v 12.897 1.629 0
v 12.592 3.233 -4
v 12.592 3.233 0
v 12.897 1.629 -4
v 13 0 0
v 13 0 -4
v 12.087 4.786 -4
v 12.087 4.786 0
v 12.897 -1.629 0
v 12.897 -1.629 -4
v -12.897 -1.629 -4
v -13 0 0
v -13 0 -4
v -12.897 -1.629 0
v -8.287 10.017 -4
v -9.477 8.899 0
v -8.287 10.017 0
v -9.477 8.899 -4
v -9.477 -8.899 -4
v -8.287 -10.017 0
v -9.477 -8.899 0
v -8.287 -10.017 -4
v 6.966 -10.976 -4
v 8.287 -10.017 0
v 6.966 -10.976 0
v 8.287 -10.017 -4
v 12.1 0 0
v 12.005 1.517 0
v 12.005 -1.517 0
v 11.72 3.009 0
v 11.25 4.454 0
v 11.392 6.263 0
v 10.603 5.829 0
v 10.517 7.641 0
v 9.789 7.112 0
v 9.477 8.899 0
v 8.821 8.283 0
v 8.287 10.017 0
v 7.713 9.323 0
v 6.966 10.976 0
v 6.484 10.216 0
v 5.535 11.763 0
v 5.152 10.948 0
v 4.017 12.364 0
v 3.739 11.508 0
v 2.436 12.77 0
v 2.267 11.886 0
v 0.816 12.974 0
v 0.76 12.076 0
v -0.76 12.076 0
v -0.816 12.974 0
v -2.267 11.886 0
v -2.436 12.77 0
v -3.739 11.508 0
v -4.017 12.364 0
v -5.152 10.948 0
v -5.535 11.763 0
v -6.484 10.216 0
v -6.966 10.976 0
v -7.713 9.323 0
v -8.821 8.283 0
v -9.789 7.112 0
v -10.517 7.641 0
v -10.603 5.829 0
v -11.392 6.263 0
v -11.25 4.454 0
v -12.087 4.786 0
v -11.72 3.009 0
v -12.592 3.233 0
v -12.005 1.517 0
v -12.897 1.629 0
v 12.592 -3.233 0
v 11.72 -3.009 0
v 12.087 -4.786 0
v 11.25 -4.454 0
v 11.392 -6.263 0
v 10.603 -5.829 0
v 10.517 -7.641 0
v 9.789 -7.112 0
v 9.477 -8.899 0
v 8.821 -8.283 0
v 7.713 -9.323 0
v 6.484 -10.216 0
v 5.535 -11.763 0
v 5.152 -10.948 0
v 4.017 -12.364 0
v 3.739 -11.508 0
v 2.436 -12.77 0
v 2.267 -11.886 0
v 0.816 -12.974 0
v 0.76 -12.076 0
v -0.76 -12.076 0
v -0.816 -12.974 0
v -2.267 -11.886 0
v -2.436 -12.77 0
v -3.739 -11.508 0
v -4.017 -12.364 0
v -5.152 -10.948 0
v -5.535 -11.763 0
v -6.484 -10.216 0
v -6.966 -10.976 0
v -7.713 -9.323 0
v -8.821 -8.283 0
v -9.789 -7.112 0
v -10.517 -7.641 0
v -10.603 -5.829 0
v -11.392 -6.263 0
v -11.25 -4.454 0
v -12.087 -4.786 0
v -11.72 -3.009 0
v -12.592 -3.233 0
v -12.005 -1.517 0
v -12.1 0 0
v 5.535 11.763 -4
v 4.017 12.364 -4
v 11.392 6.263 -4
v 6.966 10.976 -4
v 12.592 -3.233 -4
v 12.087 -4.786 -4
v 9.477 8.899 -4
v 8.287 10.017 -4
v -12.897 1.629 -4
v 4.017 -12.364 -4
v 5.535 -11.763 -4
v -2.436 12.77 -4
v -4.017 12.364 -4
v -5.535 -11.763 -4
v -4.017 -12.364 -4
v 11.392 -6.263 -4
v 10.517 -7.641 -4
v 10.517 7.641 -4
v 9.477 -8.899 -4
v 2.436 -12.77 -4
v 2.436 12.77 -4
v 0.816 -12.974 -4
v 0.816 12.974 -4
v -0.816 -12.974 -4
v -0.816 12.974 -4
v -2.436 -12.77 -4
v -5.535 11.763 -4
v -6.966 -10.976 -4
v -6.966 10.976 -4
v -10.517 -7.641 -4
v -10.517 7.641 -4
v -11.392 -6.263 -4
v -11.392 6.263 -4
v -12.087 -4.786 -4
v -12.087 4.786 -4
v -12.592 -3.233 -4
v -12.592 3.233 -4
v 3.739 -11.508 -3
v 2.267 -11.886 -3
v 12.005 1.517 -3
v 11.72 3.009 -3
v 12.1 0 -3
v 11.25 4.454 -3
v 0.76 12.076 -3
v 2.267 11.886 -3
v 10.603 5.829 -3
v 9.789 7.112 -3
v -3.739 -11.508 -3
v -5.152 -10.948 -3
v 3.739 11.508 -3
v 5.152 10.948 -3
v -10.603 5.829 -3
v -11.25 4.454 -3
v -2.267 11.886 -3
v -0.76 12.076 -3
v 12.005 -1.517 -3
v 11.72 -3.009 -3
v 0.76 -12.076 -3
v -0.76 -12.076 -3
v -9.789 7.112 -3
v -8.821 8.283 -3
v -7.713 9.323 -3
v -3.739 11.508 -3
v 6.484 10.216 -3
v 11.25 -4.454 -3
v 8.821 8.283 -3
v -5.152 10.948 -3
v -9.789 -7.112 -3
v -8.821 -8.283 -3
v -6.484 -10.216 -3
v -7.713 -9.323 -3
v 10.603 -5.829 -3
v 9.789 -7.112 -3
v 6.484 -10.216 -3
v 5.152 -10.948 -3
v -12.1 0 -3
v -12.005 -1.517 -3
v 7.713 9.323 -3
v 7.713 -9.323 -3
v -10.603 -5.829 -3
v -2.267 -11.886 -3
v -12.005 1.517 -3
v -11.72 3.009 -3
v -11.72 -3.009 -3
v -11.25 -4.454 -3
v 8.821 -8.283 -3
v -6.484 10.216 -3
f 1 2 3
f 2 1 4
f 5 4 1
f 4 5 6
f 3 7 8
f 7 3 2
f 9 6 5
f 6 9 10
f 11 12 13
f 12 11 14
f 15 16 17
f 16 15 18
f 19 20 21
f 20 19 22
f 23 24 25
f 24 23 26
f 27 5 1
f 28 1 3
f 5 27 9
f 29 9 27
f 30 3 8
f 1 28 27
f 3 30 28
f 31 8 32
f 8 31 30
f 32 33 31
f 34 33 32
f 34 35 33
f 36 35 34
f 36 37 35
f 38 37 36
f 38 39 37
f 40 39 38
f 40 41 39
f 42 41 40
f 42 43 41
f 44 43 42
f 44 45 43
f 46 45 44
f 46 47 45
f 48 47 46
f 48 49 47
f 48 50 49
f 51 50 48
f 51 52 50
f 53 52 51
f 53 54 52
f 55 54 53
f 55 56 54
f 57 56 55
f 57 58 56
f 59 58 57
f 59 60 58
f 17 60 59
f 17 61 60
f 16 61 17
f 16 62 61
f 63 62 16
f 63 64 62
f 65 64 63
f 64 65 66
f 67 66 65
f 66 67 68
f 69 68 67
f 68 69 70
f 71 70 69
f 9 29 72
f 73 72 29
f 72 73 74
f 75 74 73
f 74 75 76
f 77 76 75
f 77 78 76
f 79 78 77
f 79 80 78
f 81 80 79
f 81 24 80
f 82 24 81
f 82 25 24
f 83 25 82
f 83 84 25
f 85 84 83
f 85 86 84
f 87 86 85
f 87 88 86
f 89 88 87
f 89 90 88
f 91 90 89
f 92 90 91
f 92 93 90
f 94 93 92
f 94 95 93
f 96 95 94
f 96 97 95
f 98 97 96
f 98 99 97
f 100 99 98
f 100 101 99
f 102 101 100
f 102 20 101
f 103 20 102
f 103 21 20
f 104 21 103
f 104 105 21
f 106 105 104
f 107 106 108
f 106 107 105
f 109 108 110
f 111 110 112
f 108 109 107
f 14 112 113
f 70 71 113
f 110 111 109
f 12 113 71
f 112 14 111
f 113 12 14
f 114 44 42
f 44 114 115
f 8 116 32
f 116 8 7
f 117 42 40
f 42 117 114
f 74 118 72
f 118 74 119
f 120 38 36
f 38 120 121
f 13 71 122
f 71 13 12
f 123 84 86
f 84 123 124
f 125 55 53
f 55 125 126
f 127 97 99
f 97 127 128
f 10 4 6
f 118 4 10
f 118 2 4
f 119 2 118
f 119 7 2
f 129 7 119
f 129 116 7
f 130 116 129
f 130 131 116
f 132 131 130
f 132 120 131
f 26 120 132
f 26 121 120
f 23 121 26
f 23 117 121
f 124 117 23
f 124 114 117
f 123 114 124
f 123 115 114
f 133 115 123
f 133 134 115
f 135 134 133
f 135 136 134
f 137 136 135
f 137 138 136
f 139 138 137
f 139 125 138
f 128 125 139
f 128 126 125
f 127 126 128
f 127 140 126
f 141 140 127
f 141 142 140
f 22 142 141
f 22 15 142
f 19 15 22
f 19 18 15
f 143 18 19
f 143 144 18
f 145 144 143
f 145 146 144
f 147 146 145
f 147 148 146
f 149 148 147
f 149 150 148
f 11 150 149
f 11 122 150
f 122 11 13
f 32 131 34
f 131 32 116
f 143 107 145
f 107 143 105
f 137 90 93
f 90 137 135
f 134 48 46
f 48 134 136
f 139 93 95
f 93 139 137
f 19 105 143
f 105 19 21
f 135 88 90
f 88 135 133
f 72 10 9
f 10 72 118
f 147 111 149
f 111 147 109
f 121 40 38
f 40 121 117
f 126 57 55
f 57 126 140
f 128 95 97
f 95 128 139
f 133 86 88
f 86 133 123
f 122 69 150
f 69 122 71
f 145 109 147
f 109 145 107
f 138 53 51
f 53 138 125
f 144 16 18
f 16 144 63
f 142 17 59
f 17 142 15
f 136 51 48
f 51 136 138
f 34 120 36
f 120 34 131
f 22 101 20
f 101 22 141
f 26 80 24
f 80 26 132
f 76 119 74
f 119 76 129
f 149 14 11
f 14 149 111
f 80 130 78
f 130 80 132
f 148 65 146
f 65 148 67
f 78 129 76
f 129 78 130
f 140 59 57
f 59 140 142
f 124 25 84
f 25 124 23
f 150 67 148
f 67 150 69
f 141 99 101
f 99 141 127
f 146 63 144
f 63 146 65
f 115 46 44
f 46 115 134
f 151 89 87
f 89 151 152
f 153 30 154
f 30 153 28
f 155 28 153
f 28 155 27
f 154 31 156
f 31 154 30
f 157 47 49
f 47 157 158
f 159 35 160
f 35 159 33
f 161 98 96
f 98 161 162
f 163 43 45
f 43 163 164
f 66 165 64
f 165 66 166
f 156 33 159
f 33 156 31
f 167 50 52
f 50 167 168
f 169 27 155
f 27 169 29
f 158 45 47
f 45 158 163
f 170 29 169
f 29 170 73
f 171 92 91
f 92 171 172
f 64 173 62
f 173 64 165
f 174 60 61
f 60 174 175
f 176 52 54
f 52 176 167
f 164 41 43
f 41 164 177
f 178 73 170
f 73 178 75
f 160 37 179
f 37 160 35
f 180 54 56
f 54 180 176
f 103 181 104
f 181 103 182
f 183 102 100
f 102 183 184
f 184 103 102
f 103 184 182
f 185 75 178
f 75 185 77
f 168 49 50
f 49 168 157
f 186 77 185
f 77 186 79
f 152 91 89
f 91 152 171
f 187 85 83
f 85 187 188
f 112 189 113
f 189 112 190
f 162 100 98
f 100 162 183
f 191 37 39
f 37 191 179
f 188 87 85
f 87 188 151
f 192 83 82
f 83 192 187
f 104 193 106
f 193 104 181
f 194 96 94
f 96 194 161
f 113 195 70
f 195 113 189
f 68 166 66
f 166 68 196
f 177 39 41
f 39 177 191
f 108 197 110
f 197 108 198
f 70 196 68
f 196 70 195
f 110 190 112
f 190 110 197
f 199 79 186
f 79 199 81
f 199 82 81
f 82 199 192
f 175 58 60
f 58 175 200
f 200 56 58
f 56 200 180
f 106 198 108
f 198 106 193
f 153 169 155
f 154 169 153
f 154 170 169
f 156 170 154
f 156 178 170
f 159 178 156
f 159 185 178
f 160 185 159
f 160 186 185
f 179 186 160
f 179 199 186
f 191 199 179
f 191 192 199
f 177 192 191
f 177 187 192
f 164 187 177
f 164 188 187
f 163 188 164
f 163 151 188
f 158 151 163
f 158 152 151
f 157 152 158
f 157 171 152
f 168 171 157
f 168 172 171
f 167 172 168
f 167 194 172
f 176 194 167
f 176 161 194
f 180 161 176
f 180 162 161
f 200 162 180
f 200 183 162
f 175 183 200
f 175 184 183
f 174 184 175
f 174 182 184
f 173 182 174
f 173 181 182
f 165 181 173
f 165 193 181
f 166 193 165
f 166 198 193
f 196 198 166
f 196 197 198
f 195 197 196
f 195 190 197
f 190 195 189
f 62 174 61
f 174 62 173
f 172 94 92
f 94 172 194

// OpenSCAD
$fn = 50;


difference() {
	union() {
		translate(v = [0, 0, -4.0000000000]) {
			cylinder(h = 4, r = 13.0000000000);
		}
	}
	union() {
		#translate(v = [0, 0, -3.0000000000]) {
			cylinder(h = 3, r = 12.1000000000);
		}
	}
}
